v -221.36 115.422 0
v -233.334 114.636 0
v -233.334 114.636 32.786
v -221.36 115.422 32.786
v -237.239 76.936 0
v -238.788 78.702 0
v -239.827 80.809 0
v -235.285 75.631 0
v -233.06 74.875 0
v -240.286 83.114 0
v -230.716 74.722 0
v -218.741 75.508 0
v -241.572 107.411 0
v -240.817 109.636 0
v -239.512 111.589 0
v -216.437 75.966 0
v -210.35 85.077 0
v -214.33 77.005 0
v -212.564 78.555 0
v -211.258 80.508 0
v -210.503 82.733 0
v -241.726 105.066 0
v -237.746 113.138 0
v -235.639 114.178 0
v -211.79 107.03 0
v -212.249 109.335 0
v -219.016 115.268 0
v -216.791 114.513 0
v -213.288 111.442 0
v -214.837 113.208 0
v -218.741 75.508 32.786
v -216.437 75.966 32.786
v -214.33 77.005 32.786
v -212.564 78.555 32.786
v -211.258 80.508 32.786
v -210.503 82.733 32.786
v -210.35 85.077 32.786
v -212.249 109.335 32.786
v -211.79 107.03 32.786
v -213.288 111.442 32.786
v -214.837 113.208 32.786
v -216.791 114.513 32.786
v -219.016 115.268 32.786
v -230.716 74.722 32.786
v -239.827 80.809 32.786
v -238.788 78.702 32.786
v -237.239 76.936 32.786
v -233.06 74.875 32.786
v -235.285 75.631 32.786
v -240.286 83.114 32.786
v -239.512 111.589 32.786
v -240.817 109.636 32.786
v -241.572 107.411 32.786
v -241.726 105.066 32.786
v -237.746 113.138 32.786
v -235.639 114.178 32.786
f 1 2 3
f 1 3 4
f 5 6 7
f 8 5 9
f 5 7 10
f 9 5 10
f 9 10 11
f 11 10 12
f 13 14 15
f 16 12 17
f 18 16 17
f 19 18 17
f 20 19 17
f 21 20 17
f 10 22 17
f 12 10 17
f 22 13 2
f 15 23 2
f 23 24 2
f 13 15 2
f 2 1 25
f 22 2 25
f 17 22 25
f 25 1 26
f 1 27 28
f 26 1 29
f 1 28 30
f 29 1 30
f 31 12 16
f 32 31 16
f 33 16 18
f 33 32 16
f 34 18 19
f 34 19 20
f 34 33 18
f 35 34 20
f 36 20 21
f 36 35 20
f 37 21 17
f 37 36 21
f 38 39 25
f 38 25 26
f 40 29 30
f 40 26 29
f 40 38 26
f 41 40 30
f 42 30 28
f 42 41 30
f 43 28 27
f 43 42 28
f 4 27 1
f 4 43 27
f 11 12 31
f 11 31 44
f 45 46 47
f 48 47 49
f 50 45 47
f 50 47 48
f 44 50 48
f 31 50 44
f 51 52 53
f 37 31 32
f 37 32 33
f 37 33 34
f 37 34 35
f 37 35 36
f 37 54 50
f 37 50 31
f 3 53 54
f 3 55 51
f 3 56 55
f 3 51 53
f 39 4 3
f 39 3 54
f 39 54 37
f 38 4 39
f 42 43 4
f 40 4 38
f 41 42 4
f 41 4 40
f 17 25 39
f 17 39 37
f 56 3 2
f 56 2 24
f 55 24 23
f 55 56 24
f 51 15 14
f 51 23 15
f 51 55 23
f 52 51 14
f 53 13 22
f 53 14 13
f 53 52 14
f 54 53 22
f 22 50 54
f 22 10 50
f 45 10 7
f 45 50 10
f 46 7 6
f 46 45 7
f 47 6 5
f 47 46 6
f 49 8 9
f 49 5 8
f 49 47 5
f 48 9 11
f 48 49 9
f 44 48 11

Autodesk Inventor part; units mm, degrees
ref_plane "YZ Plane" through (0, 0, 0) normal (1, 0, 0) x (0, 1, 0)
ref_plane "XZ Plane" through (0, 0, 0) normal (0, 1, 0) x (-1, 0, 0)
sketch "Sketch1" plane through (0, 0, 0) normal (0, 0, 1) x (1, 0, 0)
  circle A0 centre (9.0867, 110.4972) radius 1.6 projected
  arc A1 (10.396, 90.5401) -> (7.7775, 130.4543) centre (9.0867, 110.4972) ccw projected
  line L0 (-242.3149, 114.047) -> (7.7775, 130.4543) projected
  line L1 (-239.6964, 74.1328) -> (-242.3149, 114.047) projected
  line L2 (10.396, 90.5401) -> (-239.6964, 74.1328) projected
  circle A2 centre (9.0867, 110.4972) radius 20
  line L3 (-242.3149, 114.047) -> (-212.3793, 116.0109)
  line L4 (-212.3793, 116.0109) -> (-209.7607, 76.0967)
  point P0 (0, 0)
  dimension "d0" = 30
ref_plane "Work Plane1" through (-89.0919, -102.1665, 32.7858) normal (0, 0, -1) x (0, 1, 0)
extrude "Extrusion1" add sketch "Sketch1" along normal up to surface (32.7858 mm away) contours L2 L1 L0 L4
fillet "Fillet1" radius 9 4 edges at (-209.7607, 76.0967, 16.3929) (-239.6964, 74.1328, 16.3929) (-212.3793, 116.0109, 16.3929) (-242.3149, 114.047, 16.3929)
properties part number "wspornik"
